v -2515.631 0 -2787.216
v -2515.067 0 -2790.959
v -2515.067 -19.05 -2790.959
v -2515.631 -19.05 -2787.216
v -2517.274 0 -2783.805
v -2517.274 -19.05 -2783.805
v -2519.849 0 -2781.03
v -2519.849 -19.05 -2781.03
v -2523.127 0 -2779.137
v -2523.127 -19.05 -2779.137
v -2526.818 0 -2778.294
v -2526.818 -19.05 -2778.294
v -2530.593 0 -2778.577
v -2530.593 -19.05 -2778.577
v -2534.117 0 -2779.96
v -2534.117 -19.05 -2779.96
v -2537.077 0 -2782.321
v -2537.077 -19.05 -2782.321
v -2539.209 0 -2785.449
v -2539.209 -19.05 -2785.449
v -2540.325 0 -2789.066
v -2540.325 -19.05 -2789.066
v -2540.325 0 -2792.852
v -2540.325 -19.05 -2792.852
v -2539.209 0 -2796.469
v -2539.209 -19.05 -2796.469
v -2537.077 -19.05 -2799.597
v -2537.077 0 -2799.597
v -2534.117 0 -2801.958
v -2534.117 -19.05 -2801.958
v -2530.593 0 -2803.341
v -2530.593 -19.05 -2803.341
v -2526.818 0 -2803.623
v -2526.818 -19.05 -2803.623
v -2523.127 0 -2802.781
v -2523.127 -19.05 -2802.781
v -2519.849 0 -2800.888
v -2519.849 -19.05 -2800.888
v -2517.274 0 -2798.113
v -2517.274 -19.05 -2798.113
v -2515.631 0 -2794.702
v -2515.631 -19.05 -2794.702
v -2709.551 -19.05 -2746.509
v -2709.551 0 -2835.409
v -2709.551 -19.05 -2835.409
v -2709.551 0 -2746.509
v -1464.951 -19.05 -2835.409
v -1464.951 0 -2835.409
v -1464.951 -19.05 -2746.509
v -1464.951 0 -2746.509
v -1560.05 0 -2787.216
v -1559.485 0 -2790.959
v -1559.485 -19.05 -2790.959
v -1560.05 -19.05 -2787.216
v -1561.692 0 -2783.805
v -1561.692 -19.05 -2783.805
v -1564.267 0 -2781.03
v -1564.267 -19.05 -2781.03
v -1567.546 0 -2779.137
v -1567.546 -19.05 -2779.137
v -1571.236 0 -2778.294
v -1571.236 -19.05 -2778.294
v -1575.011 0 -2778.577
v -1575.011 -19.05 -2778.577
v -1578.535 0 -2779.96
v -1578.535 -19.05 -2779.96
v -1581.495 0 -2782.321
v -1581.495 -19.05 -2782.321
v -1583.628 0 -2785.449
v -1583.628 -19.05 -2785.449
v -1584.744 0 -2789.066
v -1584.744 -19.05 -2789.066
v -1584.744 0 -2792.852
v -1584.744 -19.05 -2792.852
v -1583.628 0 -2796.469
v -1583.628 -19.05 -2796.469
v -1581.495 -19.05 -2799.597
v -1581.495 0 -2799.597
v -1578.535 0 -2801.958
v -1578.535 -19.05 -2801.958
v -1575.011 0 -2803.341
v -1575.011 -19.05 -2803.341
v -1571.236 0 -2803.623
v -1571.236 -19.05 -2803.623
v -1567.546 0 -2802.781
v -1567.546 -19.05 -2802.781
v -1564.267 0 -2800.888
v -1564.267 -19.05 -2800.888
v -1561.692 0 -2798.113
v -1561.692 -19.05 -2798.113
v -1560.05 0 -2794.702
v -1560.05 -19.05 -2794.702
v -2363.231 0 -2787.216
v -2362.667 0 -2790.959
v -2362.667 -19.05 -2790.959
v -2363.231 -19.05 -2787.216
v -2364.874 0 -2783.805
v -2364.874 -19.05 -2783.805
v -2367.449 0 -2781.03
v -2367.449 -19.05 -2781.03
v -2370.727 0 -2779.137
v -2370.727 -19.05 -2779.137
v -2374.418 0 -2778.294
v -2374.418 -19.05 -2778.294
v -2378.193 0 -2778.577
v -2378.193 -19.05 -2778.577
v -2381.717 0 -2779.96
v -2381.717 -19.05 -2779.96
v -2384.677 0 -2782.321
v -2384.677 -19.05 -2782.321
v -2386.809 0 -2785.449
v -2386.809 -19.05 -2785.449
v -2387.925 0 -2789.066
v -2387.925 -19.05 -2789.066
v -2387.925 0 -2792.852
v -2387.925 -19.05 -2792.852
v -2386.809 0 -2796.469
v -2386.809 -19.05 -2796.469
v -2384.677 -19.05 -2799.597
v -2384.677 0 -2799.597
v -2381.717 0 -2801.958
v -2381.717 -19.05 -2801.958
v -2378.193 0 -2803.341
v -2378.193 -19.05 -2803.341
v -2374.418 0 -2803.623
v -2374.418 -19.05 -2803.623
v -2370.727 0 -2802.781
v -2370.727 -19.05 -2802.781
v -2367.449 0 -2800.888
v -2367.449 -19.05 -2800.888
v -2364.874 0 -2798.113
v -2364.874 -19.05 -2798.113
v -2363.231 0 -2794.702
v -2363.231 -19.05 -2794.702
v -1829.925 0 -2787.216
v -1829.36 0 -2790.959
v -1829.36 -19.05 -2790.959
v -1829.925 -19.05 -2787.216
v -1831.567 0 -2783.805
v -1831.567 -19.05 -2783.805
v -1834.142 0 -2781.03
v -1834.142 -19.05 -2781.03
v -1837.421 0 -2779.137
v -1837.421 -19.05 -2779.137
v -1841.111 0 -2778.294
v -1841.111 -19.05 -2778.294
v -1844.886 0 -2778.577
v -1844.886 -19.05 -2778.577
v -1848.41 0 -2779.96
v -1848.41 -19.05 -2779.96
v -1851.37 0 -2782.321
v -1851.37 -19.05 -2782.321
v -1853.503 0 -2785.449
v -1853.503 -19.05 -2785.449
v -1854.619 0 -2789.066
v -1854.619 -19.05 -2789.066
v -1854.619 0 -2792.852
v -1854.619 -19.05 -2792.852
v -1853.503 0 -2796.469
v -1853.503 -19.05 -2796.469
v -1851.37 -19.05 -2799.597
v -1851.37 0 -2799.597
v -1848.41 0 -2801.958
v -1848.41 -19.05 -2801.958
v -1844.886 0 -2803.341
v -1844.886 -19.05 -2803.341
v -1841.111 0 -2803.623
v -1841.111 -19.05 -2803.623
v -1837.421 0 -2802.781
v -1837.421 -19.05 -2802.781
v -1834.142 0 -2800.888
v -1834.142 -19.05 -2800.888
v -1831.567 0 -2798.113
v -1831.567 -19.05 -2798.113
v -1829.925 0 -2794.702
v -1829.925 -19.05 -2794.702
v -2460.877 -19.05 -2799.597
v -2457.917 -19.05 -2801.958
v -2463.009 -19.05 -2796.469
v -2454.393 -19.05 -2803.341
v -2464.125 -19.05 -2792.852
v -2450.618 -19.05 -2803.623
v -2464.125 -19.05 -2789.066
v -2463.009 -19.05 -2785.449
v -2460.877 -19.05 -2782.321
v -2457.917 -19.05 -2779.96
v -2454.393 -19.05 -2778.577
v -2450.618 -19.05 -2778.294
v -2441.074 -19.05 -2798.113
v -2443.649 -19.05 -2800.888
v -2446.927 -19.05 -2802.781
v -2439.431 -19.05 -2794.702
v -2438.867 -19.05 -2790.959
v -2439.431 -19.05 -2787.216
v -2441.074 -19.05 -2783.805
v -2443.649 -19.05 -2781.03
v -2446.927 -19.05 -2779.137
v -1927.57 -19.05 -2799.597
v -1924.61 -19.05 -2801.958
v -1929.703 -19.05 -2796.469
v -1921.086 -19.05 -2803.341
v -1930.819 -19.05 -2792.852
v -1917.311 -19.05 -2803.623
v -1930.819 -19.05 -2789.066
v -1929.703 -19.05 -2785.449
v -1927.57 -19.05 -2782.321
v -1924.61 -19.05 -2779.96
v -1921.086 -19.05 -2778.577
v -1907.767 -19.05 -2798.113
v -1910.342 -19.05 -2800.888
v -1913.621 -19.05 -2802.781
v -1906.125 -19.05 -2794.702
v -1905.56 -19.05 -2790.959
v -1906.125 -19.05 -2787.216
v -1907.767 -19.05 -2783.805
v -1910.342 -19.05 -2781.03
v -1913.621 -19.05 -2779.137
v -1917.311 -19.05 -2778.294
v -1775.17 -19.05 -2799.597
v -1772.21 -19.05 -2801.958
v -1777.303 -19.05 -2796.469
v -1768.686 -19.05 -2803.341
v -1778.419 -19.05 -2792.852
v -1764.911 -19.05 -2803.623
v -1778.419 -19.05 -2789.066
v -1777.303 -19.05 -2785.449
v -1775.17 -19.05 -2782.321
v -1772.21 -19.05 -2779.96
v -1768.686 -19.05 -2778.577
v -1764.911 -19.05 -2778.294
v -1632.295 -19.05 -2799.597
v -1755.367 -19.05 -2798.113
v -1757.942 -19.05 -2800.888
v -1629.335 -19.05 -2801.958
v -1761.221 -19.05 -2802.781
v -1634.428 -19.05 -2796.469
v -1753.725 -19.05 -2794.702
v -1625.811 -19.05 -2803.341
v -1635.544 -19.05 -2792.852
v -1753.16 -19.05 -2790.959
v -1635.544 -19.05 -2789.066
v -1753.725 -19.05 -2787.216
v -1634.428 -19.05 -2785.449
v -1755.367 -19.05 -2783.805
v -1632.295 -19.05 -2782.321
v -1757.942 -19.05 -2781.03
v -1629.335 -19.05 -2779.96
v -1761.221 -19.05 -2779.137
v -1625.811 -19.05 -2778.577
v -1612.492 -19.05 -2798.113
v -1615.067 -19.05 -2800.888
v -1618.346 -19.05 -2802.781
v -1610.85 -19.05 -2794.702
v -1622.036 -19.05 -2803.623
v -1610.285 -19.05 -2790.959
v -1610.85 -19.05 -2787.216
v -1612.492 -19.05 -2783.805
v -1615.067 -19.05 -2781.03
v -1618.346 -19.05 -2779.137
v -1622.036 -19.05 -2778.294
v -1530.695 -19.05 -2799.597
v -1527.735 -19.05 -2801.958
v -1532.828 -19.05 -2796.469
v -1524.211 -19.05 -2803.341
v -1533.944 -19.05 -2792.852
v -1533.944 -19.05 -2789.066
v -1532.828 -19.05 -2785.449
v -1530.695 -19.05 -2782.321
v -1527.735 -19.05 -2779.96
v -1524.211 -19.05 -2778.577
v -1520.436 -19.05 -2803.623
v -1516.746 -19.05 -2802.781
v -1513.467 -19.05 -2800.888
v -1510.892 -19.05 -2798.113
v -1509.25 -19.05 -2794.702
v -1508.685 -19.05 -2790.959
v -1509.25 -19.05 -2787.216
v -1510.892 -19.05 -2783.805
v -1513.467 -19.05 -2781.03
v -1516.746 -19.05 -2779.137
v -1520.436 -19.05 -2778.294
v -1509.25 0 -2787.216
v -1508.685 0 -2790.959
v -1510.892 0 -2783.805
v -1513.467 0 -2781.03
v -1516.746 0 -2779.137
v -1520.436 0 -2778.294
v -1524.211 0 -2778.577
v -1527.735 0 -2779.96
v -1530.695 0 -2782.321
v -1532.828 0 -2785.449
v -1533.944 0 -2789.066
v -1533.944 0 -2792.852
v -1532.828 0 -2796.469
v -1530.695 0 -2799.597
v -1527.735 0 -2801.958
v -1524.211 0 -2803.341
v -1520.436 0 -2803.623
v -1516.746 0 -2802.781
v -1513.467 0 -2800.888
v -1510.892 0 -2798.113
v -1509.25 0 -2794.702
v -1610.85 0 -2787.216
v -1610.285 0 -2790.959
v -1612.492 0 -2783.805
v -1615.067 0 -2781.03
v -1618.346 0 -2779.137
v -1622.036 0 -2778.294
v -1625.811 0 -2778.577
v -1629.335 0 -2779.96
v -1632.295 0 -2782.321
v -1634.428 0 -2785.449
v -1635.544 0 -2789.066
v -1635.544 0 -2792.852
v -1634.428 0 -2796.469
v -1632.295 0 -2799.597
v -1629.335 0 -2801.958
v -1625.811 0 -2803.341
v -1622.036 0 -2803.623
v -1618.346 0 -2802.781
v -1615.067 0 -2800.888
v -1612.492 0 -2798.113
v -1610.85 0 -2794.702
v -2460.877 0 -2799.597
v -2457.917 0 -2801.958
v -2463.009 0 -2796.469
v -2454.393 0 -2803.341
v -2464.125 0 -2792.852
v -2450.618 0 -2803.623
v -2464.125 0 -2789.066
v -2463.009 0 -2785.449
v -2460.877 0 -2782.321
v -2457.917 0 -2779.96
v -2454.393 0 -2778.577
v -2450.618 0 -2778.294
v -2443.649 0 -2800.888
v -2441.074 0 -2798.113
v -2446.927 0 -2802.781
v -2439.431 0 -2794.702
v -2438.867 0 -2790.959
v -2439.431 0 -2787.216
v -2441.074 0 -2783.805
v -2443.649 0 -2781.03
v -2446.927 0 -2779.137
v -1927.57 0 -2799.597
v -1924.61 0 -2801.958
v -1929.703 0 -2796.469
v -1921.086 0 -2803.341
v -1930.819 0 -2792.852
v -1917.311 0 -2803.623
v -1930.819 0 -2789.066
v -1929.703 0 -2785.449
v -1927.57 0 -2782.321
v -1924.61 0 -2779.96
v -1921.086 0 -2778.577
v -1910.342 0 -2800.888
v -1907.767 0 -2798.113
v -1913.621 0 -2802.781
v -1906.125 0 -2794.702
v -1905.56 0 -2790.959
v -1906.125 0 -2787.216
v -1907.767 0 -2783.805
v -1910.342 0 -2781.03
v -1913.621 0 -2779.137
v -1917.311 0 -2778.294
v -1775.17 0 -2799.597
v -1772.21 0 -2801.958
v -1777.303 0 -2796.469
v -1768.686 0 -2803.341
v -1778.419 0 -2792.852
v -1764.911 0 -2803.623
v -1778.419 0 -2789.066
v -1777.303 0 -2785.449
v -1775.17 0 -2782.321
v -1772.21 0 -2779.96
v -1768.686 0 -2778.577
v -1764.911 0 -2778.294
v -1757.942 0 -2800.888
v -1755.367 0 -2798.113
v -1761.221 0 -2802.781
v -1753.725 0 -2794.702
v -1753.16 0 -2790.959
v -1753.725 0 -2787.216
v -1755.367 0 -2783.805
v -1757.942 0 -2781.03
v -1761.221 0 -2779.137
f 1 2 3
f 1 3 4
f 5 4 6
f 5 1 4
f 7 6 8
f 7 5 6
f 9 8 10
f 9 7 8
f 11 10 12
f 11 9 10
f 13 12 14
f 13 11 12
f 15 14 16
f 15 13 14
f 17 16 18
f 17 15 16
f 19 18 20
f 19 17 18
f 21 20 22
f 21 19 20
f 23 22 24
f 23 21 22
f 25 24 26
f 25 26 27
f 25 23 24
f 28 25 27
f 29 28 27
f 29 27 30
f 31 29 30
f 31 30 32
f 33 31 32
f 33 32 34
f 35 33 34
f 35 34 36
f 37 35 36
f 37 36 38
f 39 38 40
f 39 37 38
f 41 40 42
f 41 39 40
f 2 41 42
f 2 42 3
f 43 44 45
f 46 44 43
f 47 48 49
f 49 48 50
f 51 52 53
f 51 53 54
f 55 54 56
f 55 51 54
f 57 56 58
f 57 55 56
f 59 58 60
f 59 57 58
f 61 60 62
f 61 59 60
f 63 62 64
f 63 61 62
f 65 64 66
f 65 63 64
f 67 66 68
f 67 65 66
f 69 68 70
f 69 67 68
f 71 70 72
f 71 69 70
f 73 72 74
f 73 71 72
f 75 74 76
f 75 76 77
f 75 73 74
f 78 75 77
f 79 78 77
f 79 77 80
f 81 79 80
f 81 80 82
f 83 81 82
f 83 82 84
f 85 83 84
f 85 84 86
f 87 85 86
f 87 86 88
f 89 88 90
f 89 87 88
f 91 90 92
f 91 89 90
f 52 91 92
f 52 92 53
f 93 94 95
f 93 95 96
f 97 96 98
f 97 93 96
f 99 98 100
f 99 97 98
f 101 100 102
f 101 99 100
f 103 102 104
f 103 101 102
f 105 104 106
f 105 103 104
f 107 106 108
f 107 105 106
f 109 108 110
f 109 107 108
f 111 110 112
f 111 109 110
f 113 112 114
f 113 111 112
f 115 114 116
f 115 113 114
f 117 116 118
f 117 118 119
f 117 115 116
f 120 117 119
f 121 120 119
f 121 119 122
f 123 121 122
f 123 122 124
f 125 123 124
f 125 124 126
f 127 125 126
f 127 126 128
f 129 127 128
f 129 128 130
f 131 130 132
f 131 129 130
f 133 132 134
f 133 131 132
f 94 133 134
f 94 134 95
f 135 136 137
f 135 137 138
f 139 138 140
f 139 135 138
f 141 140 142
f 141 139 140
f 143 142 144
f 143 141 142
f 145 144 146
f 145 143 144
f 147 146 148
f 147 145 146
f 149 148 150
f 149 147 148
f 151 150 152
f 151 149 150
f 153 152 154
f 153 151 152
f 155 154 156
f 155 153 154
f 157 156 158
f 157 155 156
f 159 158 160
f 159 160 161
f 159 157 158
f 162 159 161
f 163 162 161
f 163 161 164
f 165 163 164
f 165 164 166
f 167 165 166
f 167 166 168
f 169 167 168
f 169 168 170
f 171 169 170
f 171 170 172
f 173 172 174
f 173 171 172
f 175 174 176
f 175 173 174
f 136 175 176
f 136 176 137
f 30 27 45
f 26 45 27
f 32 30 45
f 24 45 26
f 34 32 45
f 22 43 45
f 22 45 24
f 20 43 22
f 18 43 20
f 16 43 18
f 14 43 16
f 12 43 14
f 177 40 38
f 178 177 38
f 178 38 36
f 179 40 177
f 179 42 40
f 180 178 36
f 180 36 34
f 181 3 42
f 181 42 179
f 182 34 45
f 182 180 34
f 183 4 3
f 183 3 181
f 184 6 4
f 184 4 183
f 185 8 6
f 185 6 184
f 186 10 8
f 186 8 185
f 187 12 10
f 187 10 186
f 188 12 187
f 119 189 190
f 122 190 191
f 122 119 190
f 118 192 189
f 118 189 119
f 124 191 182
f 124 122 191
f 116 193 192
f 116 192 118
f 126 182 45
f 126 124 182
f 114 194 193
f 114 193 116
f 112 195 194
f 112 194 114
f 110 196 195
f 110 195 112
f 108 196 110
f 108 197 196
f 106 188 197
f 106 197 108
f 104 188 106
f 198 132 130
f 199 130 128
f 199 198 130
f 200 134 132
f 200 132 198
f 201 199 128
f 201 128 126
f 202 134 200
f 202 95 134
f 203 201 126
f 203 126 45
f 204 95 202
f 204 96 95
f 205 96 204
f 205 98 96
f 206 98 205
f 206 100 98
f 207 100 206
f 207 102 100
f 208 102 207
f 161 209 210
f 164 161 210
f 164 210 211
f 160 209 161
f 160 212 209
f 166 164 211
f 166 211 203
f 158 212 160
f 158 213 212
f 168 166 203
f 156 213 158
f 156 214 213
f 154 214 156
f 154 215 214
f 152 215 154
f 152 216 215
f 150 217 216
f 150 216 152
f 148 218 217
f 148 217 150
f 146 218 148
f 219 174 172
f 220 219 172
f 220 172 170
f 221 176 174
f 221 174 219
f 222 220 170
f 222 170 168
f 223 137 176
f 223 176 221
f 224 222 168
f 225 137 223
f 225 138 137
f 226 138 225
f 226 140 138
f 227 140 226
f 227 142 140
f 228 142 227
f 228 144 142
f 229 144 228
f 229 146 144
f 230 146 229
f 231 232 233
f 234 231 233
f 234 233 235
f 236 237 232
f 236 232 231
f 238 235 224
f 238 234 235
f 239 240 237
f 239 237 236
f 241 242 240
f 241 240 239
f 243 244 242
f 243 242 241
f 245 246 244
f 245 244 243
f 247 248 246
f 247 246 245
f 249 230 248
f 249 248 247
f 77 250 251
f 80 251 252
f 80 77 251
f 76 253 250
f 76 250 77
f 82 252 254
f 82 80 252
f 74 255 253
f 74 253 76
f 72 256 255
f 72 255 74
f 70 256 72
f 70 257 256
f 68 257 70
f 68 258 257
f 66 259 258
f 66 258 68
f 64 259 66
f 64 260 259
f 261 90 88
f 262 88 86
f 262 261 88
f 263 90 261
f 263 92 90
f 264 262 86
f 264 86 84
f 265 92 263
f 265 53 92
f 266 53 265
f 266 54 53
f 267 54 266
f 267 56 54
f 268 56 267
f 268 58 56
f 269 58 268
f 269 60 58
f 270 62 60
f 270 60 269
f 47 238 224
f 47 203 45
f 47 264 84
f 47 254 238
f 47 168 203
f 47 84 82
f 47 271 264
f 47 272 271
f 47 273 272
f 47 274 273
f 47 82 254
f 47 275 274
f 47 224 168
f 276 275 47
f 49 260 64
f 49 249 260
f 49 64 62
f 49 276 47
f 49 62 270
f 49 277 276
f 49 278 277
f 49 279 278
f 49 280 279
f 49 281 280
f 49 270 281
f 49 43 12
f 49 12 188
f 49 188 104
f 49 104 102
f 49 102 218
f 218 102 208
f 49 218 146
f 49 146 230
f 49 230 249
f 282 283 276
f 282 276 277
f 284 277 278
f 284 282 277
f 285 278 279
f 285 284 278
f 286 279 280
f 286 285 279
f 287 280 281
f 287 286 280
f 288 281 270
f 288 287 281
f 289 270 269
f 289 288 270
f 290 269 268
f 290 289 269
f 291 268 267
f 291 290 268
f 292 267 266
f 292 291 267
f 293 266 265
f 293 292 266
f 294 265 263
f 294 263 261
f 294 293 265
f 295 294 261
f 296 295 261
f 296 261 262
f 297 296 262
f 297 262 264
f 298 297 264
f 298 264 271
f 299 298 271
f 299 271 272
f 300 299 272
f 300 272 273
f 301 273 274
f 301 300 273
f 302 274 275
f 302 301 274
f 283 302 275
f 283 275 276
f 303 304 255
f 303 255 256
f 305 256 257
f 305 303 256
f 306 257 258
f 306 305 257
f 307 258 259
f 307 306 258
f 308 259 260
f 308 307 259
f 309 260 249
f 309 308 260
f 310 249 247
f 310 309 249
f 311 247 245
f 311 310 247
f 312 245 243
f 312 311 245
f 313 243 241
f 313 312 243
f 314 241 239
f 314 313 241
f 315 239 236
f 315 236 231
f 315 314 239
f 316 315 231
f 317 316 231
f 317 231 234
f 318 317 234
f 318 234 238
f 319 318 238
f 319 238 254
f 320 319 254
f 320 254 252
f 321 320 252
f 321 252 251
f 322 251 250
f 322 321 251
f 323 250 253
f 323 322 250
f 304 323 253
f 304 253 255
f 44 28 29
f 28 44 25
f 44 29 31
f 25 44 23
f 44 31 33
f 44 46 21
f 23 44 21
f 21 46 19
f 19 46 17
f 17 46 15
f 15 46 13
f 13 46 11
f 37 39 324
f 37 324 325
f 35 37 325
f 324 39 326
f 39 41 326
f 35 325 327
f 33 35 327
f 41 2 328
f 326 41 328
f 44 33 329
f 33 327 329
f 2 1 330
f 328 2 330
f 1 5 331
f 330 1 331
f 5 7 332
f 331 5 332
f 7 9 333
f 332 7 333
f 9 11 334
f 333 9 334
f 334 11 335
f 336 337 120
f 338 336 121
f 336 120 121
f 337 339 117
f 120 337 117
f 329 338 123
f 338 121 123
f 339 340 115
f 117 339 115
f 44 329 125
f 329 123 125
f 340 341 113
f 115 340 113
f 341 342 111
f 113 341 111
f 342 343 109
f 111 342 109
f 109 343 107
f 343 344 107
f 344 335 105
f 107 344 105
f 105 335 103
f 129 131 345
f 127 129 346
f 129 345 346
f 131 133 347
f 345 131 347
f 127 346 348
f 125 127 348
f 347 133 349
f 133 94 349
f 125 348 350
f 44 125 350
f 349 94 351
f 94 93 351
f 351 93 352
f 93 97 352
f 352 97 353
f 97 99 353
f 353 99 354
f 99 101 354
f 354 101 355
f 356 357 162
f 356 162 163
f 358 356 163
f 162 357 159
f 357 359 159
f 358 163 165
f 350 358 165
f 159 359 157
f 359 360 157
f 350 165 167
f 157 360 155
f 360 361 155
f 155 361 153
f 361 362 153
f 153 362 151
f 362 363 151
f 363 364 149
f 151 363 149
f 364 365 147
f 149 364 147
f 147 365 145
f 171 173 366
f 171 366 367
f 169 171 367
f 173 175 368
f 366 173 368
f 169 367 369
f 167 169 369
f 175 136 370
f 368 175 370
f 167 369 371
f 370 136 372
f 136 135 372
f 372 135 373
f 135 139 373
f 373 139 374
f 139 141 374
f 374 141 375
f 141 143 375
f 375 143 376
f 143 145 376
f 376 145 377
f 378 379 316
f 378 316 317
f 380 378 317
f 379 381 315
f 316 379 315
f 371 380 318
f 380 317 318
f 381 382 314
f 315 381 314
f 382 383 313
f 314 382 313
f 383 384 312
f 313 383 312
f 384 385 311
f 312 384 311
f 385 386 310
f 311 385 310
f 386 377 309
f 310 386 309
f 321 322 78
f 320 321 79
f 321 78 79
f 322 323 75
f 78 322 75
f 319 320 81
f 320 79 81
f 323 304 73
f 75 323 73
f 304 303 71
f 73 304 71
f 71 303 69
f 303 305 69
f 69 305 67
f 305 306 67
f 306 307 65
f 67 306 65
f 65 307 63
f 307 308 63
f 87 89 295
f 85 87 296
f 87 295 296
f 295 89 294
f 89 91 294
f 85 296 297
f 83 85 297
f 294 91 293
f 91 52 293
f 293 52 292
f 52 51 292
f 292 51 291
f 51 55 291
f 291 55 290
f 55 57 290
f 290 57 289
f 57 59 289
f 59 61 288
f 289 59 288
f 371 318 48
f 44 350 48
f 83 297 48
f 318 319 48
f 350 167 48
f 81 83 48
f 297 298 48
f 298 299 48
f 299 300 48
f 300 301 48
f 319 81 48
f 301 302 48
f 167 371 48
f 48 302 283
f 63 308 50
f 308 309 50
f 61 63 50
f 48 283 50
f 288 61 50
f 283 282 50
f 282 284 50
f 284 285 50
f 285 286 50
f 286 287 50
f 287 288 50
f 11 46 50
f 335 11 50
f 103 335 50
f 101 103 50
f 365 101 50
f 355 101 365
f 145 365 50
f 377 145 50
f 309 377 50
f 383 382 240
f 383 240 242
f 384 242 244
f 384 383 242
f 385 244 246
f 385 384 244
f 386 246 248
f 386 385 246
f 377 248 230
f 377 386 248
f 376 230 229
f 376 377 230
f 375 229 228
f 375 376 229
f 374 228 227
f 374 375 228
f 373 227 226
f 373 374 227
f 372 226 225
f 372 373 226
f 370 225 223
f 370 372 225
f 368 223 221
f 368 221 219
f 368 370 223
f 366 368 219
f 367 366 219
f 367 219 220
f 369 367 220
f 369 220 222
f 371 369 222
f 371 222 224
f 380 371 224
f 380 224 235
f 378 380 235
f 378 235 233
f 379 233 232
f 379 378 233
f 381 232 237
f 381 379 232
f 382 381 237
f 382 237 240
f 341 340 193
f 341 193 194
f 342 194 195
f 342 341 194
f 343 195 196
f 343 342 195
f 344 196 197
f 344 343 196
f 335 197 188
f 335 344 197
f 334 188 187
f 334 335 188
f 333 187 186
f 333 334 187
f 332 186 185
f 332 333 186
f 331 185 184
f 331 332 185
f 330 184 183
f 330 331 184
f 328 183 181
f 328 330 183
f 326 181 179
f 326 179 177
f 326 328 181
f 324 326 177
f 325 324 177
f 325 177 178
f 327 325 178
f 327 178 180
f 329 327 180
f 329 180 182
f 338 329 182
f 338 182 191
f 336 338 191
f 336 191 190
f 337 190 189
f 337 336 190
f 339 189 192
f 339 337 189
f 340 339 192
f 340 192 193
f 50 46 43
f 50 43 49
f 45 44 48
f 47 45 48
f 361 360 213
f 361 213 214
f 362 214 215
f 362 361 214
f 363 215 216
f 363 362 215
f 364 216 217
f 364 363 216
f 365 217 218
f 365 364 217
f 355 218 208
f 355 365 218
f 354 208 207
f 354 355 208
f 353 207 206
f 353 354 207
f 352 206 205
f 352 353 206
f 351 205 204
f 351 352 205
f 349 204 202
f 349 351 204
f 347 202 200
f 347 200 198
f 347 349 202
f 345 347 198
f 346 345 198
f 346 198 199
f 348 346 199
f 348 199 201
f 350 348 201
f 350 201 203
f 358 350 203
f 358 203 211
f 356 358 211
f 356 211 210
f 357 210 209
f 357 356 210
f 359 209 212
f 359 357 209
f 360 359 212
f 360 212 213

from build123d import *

# Parameters (mm, degrees)
F0_W     = 1244.6
F0_H     = 88.9
F0_R     = 12.7
F1_DEPTH = 19.05


with BuildPart() as f1:
    # F0 (on Front) → F1 (new body)
    with BuildSketch(Plane.XZ):
        with Locations((-2087.25102, -2790.958985)):
            Rectangle(F0_W, F0_H)
        with Locations((-2527.766928, -2790.958985)):
            Circle(F0_R, mode=Mode.SUBTRACT)
        with Locations((-2451.566928, -2790.958985)):
            Circle(F0_R, mode=Mode.SUBTRACT)
        with Locations((-2375.366928, -2790.958985)):
            Circle(F0_R, mode=Mode.SUBTRACT)
        with Locations((-1918.260349, -2790.958985)):
            Circle(F0_R, mode=Mode.SUBTRACT)
        with Locations((-1842.060349, -2790.958985)):
            Circle(F0_R, mode=Mode.SUBTRACT)
        with Locations((-1765.860349, -2790.958985)):
            Circle(F0_R, mode=Mode.SUBTRACT)
        with Locations((-1622.985349, -2790.958985)):
            Circle(F0_R, mode=Mode.SUBTRACT)
        with Locations((-1572.185349, -2790.958985)):
            Circle(F0_R, mode=Mode.SUBTRACT)
        with Locations((-1521.385349, -2790.958985)):
            Circle(F0_R, mode=Mode.SUBTRACT)
    extrude(amount=F1_DEPTH)


solid = f1.part
